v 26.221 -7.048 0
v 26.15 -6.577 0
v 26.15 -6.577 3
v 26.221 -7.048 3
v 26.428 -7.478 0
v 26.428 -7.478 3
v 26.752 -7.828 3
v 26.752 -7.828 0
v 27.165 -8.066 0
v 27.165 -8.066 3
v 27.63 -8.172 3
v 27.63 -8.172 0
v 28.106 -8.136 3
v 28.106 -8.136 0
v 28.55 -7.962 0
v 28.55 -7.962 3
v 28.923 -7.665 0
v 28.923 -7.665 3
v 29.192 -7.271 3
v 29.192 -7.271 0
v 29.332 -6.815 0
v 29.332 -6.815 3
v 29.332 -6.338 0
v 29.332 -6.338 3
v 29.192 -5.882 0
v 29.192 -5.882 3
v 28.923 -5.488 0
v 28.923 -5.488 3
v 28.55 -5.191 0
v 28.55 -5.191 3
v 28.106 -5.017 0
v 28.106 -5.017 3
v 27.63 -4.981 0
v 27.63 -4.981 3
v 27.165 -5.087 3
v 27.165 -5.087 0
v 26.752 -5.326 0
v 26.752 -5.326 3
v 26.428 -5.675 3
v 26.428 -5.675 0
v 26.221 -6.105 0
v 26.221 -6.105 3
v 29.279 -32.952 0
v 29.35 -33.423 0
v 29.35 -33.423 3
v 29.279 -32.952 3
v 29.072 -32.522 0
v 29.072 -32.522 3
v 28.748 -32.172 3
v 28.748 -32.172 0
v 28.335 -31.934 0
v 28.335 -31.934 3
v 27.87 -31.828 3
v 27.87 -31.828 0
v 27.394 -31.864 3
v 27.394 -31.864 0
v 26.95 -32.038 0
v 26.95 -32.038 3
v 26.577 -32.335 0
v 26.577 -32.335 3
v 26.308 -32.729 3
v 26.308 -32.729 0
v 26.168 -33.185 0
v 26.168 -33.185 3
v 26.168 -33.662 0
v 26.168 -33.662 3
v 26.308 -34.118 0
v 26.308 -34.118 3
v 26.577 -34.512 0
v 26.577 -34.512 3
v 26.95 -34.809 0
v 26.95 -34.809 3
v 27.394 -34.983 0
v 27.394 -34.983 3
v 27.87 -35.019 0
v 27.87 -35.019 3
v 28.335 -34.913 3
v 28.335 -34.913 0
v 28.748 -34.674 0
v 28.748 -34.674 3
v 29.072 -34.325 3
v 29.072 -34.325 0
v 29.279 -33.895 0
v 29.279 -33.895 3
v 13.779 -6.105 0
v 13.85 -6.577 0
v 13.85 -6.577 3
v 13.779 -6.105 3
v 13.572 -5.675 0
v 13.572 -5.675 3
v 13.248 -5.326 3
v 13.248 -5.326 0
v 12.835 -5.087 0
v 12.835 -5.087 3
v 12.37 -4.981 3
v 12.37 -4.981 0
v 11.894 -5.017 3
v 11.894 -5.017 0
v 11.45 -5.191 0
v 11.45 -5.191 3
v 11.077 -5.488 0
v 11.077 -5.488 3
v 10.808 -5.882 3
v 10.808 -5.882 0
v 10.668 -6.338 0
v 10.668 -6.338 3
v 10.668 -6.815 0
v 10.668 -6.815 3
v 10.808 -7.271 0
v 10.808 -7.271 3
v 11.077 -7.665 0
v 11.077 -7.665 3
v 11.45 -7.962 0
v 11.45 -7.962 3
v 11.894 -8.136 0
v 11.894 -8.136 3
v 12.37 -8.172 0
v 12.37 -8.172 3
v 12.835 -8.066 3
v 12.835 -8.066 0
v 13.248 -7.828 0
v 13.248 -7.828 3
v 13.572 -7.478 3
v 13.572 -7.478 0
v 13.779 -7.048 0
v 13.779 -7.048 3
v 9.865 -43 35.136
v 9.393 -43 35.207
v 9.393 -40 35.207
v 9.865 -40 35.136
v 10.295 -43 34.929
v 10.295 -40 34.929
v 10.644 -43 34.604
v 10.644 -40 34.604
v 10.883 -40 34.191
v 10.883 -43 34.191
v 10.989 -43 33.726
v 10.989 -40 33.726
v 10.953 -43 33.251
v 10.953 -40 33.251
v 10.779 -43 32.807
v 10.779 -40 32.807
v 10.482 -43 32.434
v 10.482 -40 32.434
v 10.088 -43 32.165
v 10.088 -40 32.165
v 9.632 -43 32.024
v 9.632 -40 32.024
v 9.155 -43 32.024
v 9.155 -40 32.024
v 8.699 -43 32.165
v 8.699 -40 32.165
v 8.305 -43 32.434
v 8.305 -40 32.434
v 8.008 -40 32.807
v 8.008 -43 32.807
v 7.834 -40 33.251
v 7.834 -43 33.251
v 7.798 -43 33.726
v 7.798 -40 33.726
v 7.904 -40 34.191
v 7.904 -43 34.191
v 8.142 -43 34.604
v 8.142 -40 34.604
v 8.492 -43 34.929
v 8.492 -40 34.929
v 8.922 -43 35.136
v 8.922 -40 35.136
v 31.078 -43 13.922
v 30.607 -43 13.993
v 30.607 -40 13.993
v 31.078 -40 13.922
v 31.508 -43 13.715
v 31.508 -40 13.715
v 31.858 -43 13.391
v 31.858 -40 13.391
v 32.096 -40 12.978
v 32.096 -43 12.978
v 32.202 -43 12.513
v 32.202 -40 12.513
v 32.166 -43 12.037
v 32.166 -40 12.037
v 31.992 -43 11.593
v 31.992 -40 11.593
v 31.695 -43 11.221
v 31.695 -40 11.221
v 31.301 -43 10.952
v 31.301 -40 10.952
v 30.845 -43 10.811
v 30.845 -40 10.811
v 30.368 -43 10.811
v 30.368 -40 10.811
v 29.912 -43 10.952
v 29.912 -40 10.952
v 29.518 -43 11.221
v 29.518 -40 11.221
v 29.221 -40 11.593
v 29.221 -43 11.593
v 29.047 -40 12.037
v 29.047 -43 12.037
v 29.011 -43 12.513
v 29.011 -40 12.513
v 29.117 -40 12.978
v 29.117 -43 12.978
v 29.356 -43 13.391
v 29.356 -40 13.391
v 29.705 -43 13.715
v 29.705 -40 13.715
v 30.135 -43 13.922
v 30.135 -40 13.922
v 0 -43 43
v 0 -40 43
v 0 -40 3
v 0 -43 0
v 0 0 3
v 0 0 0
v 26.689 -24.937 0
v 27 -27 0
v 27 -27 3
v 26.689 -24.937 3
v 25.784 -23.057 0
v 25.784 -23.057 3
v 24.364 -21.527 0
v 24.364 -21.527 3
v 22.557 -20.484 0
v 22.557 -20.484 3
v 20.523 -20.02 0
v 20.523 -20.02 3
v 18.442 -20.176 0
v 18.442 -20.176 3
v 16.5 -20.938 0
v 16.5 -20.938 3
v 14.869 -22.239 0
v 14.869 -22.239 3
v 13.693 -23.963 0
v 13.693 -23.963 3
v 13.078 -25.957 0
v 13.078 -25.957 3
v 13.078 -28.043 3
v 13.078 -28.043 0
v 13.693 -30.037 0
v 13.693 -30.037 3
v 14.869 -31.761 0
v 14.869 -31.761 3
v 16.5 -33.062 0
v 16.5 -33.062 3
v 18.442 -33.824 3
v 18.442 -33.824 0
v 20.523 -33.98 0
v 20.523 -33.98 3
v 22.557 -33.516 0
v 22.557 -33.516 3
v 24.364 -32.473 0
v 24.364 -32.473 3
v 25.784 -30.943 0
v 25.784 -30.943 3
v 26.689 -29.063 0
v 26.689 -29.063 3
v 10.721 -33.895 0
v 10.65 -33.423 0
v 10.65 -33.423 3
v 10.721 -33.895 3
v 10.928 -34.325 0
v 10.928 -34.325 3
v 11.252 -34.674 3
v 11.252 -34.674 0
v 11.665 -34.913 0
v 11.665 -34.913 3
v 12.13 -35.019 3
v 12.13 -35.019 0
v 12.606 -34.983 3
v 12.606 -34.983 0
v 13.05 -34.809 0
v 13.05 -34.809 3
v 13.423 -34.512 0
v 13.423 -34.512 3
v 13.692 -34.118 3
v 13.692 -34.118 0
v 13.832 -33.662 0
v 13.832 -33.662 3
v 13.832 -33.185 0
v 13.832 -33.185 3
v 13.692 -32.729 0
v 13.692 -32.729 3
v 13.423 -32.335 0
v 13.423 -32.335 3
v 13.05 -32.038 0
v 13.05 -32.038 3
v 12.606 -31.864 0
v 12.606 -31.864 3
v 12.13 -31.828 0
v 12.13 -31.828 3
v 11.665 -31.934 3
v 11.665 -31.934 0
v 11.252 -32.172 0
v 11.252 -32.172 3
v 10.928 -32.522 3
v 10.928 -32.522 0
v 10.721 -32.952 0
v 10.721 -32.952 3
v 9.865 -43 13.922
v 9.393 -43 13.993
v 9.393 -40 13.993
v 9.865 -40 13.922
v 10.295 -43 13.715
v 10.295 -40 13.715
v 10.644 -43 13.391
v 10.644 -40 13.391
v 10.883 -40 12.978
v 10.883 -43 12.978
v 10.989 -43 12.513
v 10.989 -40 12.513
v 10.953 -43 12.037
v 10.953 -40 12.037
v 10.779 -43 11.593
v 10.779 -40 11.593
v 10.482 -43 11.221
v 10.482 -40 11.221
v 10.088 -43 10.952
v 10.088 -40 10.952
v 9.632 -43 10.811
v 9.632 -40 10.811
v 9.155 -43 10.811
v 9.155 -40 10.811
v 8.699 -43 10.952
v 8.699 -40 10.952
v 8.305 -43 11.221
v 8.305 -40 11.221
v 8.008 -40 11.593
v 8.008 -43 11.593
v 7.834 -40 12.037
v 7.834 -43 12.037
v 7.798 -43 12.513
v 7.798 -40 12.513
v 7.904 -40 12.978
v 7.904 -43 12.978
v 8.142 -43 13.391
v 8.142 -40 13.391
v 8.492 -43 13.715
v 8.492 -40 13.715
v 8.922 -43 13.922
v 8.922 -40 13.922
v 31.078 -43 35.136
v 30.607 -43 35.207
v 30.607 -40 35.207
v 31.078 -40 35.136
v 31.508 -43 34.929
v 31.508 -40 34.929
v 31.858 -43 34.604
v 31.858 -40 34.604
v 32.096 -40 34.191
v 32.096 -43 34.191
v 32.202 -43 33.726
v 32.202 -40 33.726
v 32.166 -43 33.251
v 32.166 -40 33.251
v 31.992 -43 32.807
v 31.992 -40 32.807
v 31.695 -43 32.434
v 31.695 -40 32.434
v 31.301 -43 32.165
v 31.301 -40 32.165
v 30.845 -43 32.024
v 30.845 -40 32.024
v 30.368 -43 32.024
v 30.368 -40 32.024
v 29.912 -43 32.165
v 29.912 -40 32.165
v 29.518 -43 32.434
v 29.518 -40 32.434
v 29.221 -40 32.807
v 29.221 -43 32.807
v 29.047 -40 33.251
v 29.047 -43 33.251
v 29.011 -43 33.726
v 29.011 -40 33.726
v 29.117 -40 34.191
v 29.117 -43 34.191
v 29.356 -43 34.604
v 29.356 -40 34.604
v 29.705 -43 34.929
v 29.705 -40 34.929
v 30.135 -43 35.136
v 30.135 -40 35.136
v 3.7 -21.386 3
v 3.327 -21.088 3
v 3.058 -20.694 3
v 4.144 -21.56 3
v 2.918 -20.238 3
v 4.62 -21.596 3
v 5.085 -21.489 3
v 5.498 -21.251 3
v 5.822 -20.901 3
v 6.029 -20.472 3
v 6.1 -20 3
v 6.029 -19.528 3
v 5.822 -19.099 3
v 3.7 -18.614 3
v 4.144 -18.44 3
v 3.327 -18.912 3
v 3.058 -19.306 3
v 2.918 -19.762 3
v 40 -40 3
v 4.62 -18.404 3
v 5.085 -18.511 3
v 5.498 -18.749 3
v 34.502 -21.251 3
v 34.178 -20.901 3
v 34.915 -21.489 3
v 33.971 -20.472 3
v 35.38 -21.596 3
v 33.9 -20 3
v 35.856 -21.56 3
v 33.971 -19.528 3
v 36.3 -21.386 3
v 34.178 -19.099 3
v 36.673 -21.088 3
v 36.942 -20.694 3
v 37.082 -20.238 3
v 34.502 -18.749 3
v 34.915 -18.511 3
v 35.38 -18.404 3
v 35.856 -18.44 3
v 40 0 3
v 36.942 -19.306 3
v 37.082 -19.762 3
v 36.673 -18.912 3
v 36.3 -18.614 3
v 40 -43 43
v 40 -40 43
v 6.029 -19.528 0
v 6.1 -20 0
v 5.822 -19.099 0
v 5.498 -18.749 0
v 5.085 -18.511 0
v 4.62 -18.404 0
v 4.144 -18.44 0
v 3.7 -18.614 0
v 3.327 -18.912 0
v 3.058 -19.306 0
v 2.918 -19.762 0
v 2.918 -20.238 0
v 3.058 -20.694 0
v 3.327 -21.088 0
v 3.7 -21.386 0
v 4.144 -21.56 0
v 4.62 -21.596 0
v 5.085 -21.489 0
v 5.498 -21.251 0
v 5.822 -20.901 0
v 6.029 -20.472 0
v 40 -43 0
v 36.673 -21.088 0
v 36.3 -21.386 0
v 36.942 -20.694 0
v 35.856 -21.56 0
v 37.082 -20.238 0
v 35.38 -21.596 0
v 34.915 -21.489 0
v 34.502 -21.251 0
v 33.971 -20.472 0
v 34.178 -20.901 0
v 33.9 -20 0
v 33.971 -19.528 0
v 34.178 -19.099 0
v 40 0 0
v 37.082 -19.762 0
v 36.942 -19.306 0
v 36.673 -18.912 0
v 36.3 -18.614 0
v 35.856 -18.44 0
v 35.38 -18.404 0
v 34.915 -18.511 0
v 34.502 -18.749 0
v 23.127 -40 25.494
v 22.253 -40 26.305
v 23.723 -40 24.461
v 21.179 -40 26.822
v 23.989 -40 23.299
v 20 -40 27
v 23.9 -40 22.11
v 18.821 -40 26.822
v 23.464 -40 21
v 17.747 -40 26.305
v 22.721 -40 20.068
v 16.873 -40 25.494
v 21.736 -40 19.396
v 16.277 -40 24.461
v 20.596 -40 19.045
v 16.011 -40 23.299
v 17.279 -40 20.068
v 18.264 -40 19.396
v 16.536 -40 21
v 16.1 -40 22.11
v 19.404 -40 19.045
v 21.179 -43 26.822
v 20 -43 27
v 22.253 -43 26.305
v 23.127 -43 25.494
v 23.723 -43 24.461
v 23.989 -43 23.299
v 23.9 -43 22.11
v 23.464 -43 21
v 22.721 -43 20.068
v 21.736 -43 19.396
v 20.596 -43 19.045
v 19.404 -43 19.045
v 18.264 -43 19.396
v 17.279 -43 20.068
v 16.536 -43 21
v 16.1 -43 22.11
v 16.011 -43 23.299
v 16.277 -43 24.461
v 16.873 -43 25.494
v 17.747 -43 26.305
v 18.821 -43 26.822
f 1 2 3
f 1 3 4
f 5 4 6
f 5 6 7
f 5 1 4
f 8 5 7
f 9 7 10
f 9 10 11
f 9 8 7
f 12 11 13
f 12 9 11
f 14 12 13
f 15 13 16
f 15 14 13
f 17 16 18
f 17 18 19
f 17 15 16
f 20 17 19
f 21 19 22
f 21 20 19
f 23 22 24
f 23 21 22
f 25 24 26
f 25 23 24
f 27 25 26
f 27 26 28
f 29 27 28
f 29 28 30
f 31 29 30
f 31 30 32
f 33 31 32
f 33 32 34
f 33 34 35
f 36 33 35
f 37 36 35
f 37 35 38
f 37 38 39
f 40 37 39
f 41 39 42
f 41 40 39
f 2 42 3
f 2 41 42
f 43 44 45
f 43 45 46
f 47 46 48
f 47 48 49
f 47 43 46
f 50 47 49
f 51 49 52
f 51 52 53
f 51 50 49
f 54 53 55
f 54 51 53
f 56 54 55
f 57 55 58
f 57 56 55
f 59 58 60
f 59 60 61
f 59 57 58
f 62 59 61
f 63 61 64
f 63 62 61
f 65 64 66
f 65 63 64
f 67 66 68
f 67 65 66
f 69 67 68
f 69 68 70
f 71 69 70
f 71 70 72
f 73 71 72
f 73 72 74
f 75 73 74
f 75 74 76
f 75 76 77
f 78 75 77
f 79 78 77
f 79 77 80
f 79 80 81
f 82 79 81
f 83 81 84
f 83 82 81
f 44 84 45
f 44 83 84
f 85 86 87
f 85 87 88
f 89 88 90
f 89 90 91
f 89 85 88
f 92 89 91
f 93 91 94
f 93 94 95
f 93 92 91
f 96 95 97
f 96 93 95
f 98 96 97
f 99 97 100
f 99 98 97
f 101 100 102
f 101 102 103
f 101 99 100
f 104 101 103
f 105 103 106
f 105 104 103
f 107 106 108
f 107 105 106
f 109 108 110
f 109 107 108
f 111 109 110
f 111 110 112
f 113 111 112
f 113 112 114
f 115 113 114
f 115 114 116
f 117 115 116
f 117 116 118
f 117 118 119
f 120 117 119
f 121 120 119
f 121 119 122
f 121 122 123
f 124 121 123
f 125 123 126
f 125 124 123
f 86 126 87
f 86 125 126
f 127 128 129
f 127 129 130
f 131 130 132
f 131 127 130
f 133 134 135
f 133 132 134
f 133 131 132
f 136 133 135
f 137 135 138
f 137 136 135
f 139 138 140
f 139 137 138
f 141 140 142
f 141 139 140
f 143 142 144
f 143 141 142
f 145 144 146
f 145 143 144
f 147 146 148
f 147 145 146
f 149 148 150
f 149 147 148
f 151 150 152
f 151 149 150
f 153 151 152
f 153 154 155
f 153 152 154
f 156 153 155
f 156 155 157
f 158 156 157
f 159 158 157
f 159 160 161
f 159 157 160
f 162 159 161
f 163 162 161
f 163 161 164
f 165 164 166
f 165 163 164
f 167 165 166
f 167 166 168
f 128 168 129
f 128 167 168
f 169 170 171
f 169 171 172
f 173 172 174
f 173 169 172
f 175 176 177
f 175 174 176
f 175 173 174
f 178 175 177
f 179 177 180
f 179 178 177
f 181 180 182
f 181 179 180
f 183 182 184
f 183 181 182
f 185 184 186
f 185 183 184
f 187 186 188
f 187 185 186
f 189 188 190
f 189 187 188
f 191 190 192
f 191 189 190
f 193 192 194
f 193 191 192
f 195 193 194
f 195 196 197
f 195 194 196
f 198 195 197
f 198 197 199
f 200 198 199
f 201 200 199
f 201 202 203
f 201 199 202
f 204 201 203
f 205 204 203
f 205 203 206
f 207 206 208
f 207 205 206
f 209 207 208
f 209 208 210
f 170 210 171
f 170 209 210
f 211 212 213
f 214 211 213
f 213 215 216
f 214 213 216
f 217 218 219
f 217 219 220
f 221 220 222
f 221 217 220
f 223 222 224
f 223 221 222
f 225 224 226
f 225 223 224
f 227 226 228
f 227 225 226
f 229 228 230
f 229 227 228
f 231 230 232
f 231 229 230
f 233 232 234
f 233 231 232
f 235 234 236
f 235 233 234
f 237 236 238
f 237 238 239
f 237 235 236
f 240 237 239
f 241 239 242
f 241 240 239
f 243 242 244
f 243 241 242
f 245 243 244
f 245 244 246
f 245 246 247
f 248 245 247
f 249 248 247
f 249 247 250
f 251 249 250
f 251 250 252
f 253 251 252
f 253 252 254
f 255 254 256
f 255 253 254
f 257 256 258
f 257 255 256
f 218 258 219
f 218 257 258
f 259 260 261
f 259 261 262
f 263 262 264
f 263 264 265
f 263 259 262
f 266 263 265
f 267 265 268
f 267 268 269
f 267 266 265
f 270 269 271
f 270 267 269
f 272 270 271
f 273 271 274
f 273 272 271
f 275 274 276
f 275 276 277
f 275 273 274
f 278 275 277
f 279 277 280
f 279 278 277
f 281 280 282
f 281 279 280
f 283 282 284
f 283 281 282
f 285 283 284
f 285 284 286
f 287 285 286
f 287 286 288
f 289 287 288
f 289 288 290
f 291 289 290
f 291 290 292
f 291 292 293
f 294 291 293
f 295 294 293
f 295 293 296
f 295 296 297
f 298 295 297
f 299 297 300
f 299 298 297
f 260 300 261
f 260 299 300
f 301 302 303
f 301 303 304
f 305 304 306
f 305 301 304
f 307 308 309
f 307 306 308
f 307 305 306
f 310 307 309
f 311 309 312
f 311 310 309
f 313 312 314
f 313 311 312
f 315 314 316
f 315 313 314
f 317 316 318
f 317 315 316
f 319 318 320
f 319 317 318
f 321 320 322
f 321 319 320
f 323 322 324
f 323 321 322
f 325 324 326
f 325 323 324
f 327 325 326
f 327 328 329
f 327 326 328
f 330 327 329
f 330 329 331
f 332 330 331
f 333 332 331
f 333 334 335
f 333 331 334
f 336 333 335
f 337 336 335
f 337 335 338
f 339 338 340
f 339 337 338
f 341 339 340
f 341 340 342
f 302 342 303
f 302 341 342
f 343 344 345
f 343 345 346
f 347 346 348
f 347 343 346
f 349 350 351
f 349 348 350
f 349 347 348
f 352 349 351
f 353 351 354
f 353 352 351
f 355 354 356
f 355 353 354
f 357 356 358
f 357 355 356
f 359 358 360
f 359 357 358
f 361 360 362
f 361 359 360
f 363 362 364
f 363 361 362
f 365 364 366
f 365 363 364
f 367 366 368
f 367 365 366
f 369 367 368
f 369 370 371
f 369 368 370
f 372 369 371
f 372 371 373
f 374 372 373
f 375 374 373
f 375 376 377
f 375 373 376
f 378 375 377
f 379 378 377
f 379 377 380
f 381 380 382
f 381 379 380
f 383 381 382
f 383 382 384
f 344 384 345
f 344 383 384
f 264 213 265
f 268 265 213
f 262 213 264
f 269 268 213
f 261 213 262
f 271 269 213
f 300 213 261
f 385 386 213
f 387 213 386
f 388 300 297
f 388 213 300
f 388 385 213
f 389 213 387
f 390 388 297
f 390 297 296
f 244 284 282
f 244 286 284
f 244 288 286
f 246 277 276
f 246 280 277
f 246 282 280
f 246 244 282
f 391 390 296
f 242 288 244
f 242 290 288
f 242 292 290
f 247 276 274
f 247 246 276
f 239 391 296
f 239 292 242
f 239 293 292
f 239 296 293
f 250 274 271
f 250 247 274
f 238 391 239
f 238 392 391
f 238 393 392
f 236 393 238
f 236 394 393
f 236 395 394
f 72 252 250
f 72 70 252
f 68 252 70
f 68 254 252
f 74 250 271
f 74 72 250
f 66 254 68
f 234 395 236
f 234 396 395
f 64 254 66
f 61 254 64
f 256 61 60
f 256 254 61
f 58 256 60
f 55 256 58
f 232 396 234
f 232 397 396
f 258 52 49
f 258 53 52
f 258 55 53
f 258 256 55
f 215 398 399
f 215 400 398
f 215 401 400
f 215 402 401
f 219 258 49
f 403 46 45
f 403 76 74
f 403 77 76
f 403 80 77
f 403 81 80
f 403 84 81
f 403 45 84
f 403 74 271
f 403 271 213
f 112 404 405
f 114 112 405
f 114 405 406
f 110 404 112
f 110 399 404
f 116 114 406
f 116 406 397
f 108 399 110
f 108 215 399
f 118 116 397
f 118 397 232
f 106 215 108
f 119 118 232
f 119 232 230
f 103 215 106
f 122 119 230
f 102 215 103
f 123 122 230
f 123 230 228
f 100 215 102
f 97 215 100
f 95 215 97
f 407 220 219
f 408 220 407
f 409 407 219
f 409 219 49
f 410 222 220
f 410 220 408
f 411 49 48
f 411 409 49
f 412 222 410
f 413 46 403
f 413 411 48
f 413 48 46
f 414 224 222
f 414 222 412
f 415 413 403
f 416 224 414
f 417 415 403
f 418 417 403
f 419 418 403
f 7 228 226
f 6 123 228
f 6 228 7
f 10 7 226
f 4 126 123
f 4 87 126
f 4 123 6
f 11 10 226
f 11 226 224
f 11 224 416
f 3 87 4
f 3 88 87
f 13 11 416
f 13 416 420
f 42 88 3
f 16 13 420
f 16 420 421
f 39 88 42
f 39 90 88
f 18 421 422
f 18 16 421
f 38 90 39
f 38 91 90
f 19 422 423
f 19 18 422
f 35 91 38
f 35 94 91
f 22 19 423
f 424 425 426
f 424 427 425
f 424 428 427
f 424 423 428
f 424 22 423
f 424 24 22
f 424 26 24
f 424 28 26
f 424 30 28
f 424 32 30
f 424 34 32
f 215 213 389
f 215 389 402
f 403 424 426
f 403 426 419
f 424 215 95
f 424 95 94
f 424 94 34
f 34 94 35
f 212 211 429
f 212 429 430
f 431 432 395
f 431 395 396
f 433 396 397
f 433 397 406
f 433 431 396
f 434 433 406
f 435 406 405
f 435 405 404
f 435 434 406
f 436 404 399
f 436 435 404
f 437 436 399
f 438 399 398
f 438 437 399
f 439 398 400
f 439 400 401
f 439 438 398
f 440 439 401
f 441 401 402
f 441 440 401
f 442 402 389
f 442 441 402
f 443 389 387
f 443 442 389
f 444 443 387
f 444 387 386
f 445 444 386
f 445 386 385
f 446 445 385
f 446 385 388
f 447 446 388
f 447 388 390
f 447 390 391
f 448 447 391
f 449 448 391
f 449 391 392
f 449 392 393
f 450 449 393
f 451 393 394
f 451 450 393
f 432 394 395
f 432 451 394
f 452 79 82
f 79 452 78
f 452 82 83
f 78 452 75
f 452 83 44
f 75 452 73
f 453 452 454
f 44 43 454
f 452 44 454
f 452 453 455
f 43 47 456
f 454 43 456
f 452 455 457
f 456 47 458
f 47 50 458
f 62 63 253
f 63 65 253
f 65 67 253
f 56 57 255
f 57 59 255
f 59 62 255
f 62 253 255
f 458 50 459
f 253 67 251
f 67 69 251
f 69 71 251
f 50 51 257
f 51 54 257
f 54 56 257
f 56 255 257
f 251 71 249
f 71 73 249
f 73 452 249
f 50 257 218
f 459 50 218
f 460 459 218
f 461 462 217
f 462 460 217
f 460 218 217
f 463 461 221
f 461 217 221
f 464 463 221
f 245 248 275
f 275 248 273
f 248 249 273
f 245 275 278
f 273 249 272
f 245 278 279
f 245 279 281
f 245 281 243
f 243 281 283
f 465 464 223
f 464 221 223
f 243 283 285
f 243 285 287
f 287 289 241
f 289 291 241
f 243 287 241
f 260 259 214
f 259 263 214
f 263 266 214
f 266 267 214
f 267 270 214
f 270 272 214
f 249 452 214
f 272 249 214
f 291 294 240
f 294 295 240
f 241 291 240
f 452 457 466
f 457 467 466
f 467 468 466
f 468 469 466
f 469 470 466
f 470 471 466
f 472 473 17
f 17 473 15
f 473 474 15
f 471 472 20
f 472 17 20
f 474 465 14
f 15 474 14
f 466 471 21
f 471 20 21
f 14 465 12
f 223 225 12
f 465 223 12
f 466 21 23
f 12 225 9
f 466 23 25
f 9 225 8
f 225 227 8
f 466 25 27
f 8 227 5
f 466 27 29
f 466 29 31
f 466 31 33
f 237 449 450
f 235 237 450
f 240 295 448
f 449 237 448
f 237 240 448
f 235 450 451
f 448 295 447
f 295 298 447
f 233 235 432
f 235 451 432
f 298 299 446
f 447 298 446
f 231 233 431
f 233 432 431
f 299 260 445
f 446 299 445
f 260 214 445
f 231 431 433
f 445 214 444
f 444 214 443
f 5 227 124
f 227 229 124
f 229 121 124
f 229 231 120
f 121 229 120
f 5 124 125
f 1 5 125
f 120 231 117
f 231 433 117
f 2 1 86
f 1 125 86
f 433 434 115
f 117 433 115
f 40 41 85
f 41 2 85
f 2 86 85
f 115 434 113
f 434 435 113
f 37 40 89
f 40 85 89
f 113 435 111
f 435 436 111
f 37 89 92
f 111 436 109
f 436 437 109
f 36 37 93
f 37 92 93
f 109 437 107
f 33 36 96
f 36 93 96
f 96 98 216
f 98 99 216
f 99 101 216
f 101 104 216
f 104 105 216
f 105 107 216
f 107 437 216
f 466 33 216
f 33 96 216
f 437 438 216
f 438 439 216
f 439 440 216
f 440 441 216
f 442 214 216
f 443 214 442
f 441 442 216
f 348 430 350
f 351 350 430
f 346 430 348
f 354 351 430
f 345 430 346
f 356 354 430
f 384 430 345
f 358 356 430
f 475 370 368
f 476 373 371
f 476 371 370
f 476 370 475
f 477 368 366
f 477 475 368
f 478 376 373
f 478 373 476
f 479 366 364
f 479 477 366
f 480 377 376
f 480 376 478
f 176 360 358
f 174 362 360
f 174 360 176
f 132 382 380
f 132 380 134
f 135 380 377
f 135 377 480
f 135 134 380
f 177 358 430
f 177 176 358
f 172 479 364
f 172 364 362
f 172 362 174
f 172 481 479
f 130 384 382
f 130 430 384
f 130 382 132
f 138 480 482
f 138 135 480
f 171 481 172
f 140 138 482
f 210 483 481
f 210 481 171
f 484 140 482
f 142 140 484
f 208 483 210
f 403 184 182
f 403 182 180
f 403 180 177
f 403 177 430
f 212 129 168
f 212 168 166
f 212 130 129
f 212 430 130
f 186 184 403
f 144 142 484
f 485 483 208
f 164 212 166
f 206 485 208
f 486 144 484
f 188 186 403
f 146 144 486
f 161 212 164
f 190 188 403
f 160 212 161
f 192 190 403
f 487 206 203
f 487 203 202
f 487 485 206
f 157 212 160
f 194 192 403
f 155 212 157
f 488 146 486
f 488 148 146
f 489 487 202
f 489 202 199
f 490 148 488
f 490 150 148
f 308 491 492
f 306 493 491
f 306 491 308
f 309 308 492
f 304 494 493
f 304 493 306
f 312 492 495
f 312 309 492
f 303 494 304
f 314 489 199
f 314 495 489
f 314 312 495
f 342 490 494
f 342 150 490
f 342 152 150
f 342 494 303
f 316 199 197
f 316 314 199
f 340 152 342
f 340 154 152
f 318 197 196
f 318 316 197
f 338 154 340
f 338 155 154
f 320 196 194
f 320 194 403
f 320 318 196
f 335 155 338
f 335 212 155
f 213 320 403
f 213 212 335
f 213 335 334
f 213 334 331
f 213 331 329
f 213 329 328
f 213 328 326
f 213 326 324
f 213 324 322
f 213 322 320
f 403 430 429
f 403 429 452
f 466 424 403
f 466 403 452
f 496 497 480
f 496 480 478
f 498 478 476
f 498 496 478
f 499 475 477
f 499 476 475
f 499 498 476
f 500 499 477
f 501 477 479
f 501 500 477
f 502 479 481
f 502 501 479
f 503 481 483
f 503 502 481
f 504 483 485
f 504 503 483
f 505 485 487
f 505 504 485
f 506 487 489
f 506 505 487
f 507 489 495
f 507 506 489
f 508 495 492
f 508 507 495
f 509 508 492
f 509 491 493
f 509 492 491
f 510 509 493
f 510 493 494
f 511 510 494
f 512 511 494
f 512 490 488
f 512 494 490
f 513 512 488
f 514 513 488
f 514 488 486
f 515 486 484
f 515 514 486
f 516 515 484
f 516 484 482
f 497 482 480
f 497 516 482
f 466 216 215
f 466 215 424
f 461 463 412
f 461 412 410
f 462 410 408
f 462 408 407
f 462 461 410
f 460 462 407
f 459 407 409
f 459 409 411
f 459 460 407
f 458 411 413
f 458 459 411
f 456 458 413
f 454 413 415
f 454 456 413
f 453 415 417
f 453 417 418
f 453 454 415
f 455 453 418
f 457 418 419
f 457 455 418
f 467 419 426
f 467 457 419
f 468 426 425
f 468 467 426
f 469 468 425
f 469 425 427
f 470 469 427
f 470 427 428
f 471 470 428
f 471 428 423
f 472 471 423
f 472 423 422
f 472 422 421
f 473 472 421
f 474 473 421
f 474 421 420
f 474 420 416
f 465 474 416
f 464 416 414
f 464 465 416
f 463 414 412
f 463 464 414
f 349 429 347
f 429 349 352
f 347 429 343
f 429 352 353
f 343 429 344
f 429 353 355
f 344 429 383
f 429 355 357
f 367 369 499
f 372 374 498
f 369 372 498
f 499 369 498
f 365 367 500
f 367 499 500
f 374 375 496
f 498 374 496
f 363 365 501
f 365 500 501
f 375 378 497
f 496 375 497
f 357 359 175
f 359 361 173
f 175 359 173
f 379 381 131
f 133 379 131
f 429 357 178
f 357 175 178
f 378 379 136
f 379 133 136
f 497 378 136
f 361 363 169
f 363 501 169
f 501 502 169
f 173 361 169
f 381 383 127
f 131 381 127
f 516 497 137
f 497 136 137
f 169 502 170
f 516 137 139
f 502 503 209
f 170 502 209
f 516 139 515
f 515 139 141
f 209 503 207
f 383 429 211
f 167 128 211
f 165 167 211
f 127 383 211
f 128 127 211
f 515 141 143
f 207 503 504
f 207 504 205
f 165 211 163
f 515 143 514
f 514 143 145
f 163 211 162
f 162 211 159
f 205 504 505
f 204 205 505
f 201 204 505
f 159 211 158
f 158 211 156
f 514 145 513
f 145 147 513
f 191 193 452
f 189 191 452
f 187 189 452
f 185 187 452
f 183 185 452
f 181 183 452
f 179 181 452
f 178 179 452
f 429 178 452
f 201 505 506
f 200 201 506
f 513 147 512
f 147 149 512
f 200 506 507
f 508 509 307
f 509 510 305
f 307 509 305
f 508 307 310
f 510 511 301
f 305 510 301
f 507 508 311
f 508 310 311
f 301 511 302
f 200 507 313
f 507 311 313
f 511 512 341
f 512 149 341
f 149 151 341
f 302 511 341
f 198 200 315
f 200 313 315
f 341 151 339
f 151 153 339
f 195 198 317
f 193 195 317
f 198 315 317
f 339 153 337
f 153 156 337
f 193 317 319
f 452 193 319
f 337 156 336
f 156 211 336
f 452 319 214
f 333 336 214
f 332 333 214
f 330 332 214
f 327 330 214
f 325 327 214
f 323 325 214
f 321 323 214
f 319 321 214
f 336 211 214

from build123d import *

# Parameters (mm, degrees)
SKETCH2_W               = 40
SKETCH2_H               = 40
SKETCH2_R               = 1.6
SKETCH2_R_2             = 7
BOSS_EXTRUDE1_DEPTH     = 3
SKETCH3_W               = 43
SKETCH3_H               = 3
BOSS_EXTRUDE2_DEPTH     = 40
CUT_EXTRUDE1_DEPTH      = 72.056315694
CUT_EXTRUDE1_DEPTH_BACK = 72.056315694
SKETCH4_R               = 1.6
SKETCH4_R_2             = 4


with BuildPart() as part:
    # Sketch2 → Boss-Extrude1 (new body)
    with BuildSketch(Plane.XY):
        with Locations((20, -20)):
            Rectangle(SKETCH2_W, SKETCH2_H)
        with Locations((4.5, -20)):
            Circle(SKETCH2_R, mode=Mode.SUBTRACT)
        with Locations(Location((35.5, -20, 0), (0, 0, 180))):
            Circle(SKETCH2_R, mode=Mode.SUBTRACT)
        with Locations((12.25, -6.576606241)):
            Circle(SKETCH2_R, mode=Mode.SUBTRACT)
        with Locations(Location((27.75, -6.576606241, 0), (0, 0, 180))):
            Circle(SKETCH2_R, mode=Mode.SUBTRACT)
        with Locations((27.75, -33.423393759)):
            Circle(SKETCH2_R, mode=Mode.SUBTRACT)
        with Locations(Location((12.25, -33.423393759, 0), (0, 0, 180))):
            Circle(SKETCH2_R, mode=Mode.SUBTRACT)
        with Locations((20, -27)):
            Circle(SKETCH2_R_2, mode=Mode.SUBTRACT)
    extrude(amount=BOSS_EXTRUDE1_DEPTH)

    # Sketch3 → Boss-Extrude2 (add)
    with BuildSketch(Plane(origin=(0, 0, 0), x_dir=(0, 0, -1), z_dir=(1, 0, 0))):
        with Locations((-21.5, -41.5)):
            Rectangle(SKETCH3_W, SKETCH3_H)
    extrude(amount=BOSS_EXTRUDE2_DEPTH)

    # Sketch4 → Cut-Extrude1 (cut, two sides: drawn at the far end of the back side and taken through both)
    with BuildSketch(Plane(origin=(0, -40, 0), x_dir=(1, 0, 0), z_dir=(0, 1, 0)).offset(-CUT_EXTRUDE1_DEPTH_BACK)):
        with Locations(Location((9.393398282, -33.606601718, 0), (0, 0, 270))):
            Circle(SKETCH4_R)
        with Locations(Location((20, -23, 0), (0, 0, 270))):
            Circle(SKETCH4_R_2)
        with Locations(Location((9.393398282, -12.393398282, 0), (0, 0, 270))):
            Circle(SKETCH4_R)
        with Locations(Location((30.606601718, -12.393398282, 0), (0, 0, 270))):
            Circle(SKETCH4_R)
        with Locations(Location((30.606601718, -33.606601718, 0), (0, 0, 270))):
            Circle(SKETCH4_R)
    extrude(amount=CUT_EXTRUDE1_DEPTH + CUT_EXTRUDE1_DEPTH_BACK, mode=Mode.SUBTRACT)


solid = part.part
